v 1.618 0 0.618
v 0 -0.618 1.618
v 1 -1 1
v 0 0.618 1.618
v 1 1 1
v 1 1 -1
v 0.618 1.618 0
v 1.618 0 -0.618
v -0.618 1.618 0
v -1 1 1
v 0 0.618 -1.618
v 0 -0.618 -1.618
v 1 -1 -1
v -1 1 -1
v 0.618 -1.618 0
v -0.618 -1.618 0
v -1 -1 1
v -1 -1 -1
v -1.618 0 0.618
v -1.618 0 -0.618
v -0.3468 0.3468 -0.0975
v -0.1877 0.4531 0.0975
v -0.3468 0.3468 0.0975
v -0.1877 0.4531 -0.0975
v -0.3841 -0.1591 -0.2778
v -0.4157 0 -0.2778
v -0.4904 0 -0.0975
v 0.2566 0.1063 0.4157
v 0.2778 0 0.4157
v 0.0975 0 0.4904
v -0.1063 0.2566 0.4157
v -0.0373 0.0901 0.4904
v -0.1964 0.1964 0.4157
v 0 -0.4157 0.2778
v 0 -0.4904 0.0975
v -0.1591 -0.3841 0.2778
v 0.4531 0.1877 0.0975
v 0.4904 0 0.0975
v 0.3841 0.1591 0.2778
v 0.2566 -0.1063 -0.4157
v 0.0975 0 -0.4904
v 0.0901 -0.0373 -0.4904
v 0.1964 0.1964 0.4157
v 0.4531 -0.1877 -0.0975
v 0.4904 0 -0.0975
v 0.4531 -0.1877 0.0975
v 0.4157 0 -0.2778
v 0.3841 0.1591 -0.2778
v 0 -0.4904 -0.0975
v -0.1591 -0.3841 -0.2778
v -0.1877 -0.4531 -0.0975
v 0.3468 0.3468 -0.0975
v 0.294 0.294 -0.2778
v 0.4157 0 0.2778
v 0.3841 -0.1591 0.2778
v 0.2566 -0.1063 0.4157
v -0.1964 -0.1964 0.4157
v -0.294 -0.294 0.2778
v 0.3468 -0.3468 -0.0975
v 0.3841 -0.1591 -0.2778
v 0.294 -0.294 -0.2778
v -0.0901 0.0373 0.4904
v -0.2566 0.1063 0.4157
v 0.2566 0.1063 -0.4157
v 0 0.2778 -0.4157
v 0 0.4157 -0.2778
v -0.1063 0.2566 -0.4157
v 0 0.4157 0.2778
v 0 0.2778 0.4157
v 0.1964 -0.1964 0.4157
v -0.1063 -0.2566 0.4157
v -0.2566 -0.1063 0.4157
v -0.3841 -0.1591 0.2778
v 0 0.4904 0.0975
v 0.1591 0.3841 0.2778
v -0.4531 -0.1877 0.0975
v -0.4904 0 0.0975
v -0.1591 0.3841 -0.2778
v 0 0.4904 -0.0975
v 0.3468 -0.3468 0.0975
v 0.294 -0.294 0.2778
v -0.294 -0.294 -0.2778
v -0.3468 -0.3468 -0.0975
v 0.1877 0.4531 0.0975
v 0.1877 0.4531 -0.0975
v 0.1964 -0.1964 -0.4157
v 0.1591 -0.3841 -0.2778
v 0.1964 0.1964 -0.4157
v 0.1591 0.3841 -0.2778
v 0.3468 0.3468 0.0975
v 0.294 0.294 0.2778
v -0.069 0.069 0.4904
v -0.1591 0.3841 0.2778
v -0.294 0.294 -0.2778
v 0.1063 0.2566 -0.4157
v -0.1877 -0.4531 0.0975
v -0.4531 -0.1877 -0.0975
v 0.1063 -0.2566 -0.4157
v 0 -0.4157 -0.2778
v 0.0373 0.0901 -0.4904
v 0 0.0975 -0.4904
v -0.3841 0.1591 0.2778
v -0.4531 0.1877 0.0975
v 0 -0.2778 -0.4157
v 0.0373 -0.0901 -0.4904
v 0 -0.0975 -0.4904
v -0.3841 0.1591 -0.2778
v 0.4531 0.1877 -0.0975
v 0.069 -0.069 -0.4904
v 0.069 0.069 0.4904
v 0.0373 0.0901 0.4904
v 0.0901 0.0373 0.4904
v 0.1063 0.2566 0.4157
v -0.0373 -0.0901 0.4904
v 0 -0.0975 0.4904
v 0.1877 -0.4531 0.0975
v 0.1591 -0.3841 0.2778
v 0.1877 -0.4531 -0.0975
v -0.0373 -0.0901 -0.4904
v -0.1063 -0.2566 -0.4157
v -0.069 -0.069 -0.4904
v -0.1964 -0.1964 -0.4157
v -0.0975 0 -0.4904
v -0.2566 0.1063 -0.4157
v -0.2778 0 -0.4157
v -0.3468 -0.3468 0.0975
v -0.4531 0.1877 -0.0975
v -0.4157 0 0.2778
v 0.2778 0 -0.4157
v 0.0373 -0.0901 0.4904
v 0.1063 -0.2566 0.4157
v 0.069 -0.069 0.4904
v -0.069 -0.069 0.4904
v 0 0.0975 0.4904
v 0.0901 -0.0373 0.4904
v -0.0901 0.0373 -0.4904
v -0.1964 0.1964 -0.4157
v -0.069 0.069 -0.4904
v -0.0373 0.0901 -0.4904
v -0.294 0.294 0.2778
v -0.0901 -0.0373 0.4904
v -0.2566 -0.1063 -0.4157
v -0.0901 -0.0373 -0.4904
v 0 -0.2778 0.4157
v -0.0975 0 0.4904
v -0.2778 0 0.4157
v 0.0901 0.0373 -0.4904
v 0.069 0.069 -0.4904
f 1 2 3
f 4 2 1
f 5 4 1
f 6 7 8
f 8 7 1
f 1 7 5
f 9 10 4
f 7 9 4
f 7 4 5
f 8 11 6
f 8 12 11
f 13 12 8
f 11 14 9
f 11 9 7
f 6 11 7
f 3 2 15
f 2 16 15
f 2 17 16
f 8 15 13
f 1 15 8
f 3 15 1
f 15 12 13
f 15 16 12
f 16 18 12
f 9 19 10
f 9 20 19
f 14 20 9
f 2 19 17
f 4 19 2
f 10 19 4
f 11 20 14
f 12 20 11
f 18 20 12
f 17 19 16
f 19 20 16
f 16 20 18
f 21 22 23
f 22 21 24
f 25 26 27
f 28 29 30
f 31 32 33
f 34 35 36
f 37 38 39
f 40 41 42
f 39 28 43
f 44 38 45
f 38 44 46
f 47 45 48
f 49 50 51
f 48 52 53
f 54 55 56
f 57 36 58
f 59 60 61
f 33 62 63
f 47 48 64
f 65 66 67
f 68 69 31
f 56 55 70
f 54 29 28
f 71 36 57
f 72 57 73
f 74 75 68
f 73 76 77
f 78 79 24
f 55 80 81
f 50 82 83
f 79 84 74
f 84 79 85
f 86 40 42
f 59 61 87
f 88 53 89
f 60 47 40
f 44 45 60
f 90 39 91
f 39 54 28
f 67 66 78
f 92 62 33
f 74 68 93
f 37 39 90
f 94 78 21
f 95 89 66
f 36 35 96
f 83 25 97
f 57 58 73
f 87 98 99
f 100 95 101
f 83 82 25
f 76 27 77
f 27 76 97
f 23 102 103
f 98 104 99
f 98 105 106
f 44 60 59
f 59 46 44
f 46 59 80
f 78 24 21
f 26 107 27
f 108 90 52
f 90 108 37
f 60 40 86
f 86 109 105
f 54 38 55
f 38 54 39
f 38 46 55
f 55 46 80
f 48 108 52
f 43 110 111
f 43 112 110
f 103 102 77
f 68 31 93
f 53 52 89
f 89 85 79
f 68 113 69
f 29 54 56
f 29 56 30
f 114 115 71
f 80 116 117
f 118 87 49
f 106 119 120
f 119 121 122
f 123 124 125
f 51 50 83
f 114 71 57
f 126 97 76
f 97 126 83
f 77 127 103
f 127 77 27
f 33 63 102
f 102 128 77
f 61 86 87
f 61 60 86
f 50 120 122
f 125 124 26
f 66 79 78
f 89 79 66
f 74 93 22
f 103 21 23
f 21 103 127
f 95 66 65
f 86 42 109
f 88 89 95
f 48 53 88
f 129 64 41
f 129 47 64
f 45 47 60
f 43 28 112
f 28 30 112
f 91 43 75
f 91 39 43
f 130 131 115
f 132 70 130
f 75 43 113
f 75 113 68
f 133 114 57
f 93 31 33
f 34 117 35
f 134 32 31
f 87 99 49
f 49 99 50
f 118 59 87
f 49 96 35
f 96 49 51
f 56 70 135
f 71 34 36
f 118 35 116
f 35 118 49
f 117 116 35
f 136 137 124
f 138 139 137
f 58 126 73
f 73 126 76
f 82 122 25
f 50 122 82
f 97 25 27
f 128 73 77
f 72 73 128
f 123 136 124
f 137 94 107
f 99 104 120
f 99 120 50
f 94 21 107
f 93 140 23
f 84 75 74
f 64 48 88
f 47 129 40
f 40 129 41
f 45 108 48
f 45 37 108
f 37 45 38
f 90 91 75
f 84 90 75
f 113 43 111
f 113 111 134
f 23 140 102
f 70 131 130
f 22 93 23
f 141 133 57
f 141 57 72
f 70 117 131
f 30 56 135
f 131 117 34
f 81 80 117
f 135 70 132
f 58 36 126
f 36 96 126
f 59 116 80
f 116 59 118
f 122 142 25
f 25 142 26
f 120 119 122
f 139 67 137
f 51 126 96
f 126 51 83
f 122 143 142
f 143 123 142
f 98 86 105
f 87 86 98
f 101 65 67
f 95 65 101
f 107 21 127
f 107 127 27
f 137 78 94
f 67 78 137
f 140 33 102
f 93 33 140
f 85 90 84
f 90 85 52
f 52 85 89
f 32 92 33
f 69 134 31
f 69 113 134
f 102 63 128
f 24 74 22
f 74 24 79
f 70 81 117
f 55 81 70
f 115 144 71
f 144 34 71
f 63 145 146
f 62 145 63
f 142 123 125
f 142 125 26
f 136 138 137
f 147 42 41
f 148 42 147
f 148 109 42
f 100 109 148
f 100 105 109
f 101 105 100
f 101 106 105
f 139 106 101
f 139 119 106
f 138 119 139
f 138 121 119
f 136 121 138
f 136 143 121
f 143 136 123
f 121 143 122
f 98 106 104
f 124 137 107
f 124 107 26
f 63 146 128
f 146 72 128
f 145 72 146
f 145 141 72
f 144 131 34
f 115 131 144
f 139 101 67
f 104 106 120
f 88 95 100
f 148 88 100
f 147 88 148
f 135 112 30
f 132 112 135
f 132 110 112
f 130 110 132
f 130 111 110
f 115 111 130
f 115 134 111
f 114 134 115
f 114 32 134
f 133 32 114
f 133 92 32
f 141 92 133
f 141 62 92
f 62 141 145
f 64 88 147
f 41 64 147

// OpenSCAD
// Dodecahedron with boolean difference — regression test for
// "Conflicting edge" crash with N-gon polyhedron faces.

phi = (1 + sqrt(5)) / 2;

points = [
    [ 1,  1,  1], [ 1,  1, -1], [ 1, -1,  1], [ 1, -1, -1],
    [-1,  1,  1], [-1,  1, -1], [-1, -1,  1], [-1, -1, -1],
    [0,  1/phi,  phi], [0,  1/phi, -phi], [0, -1/phi,  phi], [0, -1/phi, -phi],
    [ 1/phi,  phi, 0], [ 1/phi, -phi, 0], [-1/phi,  phi, 0], [-1/phi, -phi, 0],
    [ phi, 0,  1/phi], [ phi, 0, -1/phi], [-phi, 0,  1/phi], [-phi, 0, -1/phi]
];

faces = [
    [0,8,10,2,16],  [0,16,17,1,12], [0,12,14,4,8],
    [1,17,3,11,9],  [1,9,5,14,12],  [2,10,6,15,13],
    [2,13,3,17,16], [3,13,15,7,11], [4,14,5,19,18],
    [4,18,6,10,8],  [5,9,11,7,19],  [6,18,19,7,15]
];

difference() {
    polyhedron(points=points, faces=faces);
    sphere(r=0.5, $fn=16);
}
